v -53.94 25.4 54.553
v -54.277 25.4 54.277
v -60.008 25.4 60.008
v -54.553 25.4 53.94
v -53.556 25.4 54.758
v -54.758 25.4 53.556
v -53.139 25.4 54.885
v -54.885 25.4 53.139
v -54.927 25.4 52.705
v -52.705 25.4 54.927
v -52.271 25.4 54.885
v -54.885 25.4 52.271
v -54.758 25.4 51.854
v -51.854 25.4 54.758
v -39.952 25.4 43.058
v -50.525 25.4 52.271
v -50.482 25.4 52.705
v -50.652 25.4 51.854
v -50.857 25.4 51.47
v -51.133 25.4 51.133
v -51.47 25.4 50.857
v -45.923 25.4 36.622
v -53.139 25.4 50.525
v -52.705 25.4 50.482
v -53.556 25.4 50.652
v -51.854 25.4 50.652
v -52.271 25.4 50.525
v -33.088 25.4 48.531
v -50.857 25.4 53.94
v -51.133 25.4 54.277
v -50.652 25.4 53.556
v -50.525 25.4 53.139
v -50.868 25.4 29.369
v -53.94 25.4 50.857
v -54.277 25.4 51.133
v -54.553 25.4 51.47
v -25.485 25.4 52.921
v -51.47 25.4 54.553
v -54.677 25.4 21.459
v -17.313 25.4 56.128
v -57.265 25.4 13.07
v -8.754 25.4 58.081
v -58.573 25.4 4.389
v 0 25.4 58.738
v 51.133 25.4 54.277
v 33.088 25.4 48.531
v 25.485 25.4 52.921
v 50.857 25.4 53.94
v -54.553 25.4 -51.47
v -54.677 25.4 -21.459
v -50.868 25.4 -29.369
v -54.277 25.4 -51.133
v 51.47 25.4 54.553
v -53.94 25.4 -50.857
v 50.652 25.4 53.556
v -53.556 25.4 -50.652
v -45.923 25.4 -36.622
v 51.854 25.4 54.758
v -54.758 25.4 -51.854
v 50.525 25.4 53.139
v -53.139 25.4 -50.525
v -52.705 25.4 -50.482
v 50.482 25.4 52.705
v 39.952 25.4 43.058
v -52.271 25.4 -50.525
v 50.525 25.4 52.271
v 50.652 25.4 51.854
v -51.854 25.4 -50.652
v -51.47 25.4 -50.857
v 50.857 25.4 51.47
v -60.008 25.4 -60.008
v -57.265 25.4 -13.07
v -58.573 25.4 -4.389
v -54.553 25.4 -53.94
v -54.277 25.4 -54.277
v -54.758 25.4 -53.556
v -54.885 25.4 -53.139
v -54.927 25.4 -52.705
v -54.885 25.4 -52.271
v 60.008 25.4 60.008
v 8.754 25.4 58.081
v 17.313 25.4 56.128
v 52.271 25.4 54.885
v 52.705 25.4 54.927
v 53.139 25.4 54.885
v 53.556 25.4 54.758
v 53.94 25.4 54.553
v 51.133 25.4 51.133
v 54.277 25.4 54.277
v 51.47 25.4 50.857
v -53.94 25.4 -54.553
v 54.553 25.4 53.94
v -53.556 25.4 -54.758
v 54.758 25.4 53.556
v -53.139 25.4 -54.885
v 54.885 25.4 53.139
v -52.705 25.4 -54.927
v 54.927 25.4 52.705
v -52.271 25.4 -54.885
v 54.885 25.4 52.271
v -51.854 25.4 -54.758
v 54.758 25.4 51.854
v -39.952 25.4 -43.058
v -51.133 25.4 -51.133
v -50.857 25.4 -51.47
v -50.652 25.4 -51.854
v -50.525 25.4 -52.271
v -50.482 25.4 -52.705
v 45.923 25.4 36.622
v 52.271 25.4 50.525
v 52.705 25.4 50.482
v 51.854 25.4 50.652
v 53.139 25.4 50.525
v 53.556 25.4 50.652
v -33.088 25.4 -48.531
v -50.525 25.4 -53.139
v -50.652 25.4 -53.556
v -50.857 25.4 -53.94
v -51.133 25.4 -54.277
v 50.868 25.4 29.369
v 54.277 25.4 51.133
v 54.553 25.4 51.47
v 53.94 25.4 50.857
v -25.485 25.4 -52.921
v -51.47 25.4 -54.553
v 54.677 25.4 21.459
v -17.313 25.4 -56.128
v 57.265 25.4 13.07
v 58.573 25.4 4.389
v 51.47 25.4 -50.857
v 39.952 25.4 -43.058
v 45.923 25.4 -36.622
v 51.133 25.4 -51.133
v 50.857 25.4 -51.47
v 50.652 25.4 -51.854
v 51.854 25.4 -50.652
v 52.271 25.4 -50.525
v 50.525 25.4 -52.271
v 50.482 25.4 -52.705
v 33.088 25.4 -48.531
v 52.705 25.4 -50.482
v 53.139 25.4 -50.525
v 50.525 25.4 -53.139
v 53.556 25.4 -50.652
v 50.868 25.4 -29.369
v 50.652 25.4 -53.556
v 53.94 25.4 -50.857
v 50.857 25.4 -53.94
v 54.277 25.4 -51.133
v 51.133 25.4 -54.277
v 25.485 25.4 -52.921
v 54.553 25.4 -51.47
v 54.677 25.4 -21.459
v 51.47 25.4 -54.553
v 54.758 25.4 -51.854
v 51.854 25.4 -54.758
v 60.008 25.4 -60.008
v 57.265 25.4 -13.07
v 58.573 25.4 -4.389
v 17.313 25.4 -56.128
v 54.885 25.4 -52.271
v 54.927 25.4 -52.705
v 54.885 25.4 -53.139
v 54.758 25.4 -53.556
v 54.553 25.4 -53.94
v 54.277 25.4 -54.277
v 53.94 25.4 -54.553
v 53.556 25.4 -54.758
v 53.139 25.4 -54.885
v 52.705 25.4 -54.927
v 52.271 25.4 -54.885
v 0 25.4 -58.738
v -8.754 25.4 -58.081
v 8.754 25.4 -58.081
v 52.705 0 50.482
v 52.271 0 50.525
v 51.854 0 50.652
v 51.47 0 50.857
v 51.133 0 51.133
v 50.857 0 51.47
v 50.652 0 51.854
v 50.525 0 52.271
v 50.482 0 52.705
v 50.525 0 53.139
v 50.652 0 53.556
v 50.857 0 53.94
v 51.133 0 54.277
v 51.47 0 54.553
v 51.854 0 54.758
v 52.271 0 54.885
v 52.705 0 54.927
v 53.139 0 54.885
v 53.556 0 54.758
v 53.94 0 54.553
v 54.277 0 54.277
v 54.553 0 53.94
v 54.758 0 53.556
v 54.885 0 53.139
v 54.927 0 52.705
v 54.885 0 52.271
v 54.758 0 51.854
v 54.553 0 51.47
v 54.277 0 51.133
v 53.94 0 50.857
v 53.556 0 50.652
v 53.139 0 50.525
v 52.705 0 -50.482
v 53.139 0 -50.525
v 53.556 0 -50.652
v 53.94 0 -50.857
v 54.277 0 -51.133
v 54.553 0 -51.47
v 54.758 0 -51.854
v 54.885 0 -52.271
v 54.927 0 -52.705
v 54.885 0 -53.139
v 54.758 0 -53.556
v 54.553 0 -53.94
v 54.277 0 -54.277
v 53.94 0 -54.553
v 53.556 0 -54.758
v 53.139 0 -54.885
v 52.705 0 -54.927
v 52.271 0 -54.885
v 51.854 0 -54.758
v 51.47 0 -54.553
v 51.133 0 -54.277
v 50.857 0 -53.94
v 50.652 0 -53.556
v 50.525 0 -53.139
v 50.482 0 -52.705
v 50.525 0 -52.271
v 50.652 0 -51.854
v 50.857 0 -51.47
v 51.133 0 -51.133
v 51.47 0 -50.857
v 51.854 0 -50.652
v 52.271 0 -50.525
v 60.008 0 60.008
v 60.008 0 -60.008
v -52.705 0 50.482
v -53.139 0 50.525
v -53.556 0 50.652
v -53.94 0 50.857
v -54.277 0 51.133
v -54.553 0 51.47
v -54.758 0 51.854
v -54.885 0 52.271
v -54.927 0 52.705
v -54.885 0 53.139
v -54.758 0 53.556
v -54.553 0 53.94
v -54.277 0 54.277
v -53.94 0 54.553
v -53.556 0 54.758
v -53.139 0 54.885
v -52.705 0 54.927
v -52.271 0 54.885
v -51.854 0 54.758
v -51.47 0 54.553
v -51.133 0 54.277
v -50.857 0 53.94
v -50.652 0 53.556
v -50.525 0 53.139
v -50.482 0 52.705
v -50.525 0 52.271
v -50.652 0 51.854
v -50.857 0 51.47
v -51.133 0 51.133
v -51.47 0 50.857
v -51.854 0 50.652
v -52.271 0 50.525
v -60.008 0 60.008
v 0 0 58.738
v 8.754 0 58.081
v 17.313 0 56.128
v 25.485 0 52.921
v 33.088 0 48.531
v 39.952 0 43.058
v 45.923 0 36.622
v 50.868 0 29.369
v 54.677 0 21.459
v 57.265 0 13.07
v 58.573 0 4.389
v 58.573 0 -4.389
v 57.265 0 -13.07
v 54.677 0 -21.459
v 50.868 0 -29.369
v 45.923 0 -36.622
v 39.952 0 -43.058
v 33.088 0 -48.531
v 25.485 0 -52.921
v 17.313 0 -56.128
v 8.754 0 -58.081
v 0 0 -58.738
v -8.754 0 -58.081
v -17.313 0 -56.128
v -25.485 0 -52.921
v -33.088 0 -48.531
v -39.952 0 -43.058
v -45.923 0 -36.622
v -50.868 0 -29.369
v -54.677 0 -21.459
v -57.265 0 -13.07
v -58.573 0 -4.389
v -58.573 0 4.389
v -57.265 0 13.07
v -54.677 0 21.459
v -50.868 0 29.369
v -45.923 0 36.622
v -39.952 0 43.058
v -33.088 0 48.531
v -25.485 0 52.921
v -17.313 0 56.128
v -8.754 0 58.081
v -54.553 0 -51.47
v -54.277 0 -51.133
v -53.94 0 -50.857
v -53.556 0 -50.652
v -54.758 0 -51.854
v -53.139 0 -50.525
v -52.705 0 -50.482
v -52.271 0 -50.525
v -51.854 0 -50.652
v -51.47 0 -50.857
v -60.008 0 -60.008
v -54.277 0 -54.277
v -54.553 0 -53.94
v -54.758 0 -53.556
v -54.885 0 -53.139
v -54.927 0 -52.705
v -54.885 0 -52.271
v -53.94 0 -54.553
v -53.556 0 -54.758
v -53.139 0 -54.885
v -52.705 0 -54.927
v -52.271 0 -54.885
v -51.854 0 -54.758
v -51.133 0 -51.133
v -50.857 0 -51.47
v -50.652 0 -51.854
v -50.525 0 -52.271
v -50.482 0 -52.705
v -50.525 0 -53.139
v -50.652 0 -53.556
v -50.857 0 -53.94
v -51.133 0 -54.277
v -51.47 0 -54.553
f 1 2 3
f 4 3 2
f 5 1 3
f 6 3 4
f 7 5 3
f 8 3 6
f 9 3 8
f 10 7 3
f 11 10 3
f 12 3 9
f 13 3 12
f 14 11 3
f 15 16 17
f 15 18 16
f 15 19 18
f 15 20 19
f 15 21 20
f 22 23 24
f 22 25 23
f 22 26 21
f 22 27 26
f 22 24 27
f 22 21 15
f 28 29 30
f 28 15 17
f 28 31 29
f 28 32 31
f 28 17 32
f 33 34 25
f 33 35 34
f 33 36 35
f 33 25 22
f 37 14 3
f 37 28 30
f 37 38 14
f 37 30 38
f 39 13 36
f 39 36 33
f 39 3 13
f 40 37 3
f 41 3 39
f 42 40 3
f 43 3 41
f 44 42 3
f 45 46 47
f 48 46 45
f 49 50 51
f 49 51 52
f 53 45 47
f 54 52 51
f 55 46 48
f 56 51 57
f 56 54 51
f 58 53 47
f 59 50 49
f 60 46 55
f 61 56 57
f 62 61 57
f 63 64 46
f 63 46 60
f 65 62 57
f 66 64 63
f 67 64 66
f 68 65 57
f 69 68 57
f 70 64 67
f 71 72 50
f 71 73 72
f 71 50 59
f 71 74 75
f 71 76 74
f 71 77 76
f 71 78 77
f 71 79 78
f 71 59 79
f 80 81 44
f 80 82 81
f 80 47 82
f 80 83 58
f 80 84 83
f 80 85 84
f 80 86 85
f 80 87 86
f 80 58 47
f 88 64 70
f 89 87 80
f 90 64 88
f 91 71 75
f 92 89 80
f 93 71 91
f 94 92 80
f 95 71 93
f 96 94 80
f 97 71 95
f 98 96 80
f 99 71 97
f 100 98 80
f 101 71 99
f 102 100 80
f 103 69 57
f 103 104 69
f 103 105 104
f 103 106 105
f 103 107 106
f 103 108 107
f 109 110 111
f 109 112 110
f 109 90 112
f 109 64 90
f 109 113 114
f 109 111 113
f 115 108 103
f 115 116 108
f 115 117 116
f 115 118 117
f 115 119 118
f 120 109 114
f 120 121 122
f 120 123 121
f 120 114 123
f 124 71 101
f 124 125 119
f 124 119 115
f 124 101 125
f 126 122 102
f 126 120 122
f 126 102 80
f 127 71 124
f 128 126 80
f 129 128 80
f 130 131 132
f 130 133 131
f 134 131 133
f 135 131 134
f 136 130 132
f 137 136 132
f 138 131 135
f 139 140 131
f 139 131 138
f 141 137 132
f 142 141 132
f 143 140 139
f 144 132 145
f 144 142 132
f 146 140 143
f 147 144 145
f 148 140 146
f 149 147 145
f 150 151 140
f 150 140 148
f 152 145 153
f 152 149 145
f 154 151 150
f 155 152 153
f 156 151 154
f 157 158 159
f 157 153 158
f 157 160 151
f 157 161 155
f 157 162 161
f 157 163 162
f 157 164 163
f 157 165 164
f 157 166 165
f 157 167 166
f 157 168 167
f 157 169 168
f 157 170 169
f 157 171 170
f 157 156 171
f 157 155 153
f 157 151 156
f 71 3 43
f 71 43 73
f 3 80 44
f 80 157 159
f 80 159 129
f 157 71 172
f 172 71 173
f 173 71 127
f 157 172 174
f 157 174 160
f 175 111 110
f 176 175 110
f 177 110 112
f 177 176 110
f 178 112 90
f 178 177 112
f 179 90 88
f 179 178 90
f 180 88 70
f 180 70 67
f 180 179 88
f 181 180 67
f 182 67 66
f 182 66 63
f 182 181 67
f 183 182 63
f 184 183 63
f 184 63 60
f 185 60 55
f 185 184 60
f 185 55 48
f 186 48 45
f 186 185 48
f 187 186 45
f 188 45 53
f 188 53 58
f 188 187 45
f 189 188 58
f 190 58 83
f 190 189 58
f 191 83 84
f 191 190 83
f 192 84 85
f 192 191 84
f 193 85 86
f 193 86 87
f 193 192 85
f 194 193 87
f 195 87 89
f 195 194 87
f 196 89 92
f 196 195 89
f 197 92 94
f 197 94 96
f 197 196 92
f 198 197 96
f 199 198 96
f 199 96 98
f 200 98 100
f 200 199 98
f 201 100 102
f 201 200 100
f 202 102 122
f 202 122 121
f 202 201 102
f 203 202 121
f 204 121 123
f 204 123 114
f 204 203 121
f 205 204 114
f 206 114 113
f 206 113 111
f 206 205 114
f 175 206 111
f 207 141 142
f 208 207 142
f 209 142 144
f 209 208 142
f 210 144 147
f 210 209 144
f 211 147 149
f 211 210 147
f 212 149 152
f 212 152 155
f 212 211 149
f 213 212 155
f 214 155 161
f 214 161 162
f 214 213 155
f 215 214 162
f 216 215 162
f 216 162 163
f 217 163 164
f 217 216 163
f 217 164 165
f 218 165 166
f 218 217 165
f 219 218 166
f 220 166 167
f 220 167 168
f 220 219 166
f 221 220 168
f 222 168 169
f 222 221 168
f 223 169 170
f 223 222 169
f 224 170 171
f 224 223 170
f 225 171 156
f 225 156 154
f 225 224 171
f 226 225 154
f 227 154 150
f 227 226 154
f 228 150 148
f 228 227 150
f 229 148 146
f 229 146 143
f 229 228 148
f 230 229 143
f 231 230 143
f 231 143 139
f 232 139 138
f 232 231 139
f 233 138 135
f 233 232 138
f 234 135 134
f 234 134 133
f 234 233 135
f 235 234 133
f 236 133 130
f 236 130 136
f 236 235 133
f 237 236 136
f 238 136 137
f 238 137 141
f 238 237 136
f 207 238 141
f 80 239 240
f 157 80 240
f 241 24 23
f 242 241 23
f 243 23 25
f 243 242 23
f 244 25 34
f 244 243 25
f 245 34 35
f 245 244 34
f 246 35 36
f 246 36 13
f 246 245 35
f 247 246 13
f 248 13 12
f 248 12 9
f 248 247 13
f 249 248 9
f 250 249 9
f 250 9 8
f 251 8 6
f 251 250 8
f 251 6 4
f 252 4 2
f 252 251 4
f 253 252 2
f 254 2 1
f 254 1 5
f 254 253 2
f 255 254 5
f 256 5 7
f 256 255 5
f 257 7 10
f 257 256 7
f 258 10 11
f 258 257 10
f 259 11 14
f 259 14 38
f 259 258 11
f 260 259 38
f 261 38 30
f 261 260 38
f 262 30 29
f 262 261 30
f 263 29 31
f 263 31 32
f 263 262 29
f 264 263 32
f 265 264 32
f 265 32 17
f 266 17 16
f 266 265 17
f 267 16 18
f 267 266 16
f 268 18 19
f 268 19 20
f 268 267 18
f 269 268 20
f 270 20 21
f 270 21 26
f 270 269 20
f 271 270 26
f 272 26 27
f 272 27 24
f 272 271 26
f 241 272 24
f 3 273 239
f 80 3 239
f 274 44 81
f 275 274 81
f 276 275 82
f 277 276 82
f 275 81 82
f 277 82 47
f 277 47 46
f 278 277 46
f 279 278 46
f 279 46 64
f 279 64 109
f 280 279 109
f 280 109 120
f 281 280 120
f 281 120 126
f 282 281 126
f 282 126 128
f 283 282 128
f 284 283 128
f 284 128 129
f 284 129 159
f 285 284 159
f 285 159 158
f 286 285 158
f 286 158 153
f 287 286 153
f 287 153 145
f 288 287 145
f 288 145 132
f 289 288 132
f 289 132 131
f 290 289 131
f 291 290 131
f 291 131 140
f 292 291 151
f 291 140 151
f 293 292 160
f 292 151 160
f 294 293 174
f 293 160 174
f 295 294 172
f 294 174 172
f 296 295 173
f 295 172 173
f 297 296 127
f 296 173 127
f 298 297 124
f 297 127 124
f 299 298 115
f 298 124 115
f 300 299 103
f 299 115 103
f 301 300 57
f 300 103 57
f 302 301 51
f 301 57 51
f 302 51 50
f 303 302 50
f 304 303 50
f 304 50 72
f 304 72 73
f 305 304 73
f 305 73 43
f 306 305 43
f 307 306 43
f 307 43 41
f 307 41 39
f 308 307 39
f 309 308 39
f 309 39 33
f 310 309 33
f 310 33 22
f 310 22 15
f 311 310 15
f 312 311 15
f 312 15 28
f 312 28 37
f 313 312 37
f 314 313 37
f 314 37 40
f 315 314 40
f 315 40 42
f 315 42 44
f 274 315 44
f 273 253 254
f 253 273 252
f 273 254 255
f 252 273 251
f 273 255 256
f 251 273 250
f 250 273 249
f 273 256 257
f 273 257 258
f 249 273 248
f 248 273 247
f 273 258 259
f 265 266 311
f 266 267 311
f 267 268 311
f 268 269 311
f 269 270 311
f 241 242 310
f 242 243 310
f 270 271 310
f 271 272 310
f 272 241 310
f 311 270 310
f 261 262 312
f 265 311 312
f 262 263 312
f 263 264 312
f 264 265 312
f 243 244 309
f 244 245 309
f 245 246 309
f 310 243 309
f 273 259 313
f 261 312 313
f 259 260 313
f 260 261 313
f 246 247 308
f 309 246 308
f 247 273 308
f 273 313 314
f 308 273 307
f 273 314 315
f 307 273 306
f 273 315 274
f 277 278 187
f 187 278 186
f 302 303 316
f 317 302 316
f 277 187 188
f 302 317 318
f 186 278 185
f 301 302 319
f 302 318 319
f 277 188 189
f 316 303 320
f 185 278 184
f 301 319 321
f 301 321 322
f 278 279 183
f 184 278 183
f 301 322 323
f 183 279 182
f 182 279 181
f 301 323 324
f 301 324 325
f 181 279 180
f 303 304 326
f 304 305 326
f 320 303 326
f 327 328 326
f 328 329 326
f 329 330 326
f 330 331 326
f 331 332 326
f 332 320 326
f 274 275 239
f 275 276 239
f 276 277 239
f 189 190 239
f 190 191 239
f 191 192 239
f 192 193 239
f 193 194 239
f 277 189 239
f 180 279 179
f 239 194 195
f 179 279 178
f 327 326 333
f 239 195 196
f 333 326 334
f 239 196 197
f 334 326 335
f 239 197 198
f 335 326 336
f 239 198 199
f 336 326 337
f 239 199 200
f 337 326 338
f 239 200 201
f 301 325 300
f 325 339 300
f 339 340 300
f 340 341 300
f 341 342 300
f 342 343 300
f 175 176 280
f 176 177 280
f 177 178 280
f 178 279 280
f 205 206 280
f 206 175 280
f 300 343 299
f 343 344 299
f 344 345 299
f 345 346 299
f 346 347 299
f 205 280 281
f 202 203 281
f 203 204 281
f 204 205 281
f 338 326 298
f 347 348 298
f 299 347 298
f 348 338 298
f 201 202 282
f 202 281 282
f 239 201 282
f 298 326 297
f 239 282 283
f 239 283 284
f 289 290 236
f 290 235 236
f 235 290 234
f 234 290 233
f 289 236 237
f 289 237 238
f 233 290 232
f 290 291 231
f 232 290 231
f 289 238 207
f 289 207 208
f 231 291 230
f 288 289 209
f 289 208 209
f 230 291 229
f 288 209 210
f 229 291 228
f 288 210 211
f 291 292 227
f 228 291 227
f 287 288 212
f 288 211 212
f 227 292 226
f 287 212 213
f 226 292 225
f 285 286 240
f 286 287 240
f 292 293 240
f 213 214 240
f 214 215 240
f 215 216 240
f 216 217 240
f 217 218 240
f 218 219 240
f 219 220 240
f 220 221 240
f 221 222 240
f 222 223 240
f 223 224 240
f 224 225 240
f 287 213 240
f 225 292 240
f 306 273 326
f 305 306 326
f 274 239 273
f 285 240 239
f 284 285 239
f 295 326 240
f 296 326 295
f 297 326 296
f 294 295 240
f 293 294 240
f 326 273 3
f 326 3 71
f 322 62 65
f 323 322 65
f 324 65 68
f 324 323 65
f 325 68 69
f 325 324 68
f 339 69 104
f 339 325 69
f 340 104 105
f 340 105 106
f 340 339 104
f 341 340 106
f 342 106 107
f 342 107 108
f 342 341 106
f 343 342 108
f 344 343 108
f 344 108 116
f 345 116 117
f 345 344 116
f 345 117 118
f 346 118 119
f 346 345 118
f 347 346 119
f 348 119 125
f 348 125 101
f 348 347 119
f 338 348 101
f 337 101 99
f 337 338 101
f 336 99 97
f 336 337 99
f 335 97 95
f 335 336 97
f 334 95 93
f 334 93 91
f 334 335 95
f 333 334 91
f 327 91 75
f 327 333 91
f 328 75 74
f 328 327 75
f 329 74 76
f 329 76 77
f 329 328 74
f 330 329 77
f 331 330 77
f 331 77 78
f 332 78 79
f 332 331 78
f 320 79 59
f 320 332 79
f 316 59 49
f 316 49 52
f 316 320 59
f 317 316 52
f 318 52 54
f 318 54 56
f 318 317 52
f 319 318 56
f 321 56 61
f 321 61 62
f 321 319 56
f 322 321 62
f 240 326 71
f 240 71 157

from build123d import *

# Parameters (mm, degrees)
SKETCH1_W           = 120.015
SKETCH1_H           = 120.015
SKETCH1_R           = 2.2225
BOSS_EXTRUDE1_DEPTH = 25.4
SKETCH2_R           = 58.7375
CUT_EXTRUDE1_DEPTH  = 89.583068995


with BuildPart() as part:
    # Sketch1 → Boss-Extrude1 (new body)
    with BuildSketch(Plane(origin=(0, 0, 0), x_dir=(1, 0, 0), z_dir=(0, 1, 0))):
        Rectangle(SKETCH1_W, SKETCH1_H)
        with Locations(Location((-52.705, 52.705, 0), (0, 0, 270))):
            Circle(SKETCH1_R, mode=Mode.SUBTRACT)
        with Locations(Location((52.705, -52.705, 0), (0, 0, 90))):
            Circle(SKETCH1_R, mode=Mode.SUBTRACT)
        with Locations(Location((52.705, 52.705, 0), (0, 0, 270))):
            Circle(SKETCH1_R, mode=Mode.SUBTRACT)
        with Locations(Location((-52.705, -52.705, 0), (0, 0, 90))):
            Circle(SKETCH1_R, mode=Mode.SUBTRACT)
    extrude(amount=BOSS_EXTRUDE1_DEPTH)

    # Sketch2 → Cut-Extrude1 (cut, through all)
    with BuildSketch(Plane(origin=(0, 25.4, 0), x_dir=(1, 0, 0), z_dir=(0, 1, 0))):
        with Locations(Location((0, 0, 0), (0, 0, 270))):
            Circle(SKETCH2_R)
    extrude(amount=-CUT_EXTRUDE1_DEPTH, mode=Mode.SUBTRACT)


solid = part.part
